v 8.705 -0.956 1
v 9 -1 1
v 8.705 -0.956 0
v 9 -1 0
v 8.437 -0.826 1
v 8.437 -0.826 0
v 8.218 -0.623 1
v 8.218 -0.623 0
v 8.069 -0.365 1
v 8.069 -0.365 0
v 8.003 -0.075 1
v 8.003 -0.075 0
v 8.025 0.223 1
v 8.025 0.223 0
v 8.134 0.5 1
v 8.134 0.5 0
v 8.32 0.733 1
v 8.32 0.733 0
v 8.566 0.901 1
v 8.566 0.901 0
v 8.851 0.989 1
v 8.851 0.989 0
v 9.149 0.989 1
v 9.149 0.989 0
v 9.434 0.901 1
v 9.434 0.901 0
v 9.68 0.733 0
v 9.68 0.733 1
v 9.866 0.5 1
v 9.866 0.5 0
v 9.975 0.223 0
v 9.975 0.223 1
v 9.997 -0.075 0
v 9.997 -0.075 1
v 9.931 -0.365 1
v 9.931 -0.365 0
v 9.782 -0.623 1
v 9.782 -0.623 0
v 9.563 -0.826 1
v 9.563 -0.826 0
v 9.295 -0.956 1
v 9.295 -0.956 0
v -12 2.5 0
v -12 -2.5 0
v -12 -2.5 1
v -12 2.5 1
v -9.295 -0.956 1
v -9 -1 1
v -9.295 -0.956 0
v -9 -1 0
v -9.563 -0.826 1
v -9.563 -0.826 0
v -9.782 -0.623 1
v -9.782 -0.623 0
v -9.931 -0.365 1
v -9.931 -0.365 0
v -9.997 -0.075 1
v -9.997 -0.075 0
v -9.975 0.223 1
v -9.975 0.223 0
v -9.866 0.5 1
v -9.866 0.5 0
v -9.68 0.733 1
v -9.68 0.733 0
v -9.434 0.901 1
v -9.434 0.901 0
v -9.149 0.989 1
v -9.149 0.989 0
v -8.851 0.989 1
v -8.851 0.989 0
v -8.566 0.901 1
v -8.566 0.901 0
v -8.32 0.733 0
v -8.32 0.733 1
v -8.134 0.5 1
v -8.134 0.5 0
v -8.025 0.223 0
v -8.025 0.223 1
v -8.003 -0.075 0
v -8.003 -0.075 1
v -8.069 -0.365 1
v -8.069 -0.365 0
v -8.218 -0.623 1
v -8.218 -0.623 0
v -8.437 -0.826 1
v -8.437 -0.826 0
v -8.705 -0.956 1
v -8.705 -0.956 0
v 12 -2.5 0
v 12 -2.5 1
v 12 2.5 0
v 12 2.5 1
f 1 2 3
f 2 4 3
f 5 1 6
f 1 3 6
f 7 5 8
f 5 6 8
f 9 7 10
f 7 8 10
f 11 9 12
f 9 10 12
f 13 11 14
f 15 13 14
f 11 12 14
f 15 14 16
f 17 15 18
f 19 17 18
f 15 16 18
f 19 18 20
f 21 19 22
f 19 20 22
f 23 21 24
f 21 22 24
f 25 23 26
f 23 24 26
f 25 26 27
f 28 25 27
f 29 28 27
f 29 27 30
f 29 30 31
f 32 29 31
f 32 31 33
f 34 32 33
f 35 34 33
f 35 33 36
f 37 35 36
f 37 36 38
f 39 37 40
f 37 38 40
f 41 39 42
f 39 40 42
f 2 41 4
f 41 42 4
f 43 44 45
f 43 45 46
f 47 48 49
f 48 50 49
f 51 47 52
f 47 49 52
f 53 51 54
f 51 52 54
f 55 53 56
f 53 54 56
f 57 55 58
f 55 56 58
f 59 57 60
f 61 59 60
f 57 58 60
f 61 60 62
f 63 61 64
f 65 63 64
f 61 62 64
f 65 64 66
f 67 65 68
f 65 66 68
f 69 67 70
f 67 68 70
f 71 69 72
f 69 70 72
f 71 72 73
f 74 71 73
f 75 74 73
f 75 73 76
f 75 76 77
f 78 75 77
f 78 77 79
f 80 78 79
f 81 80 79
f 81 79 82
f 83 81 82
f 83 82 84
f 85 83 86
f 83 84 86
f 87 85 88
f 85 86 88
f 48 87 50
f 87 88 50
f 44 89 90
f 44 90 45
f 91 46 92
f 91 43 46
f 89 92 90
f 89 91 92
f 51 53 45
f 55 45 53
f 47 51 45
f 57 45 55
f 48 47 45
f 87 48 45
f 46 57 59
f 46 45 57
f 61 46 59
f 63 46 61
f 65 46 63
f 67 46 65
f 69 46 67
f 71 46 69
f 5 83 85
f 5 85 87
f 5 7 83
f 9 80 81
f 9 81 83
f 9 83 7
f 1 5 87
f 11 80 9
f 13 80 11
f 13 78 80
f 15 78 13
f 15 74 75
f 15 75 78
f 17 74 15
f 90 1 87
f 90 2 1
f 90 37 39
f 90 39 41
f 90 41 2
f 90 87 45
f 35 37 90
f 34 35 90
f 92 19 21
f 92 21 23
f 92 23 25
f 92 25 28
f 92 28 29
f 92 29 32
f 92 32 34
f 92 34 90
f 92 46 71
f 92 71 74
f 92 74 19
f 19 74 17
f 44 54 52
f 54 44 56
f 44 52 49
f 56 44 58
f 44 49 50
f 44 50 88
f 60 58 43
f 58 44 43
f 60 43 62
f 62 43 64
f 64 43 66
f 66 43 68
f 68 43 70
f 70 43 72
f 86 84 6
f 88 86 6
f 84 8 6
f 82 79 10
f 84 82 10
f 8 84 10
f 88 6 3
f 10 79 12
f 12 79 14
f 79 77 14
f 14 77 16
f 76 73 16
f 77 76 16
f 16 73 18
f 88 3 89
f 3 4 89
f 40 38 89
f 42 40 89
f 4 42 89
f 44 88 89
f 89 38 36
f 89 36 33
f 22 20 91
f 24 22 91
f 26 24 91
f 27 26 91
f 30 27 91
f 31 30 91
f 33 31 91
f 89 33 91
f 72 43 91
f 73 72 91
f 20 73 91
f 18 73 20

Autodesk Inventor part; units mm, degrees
ref_plane "YZ Plane" through (0, 0, 0) normal (1, 0, 0) x (0, 1, 0)
ref_plane "XZ Plane" through (0, 0, 0) normal (0, 1, 0) x (-1, 0, 0)
ref_plane "XY Plane" through (0, 0, 0) normal (0, 0, 1) x (1, 0, 0)
sketch "Sketch1" plane through (0, 0, 0) normal (0, 0, 1) x (1, 0, 0)
  line L0 (-12, 2.5) -> (12, 2.5)
  line L1 (12, 2.5) -> (12, -2.5)
  line L2 (12, -2.5) -> (-12, -2.5)
  line L3 (-12, -2.5) -> (-12, 2.5)
  point P0 (0, 0)
  point P1 (12, 0)
  point P2 (0, 2.5)
  dimension "d0" = 24
  dimension "d1" = 5
extrude "Extrusion1" add sketch "Sketch1" along normal blind 1
sketch "Sketch2" plane through (0, 0, 1) normal (0, 0, 1) x (1, 0, 0)
  line L0 (-9, 0) -> (9, 0) construction
  point P0 (0, 0)
  point P1 (0, 0)
  dimension "d4" = 18
hole "Hole1" at (9, 0, 1) at (-9, 0, 1) direction (0, 0, -1) diameter 2 end through all
properties part number "probe-side-large-mesh-support-plate" material "Stainless Steel"
